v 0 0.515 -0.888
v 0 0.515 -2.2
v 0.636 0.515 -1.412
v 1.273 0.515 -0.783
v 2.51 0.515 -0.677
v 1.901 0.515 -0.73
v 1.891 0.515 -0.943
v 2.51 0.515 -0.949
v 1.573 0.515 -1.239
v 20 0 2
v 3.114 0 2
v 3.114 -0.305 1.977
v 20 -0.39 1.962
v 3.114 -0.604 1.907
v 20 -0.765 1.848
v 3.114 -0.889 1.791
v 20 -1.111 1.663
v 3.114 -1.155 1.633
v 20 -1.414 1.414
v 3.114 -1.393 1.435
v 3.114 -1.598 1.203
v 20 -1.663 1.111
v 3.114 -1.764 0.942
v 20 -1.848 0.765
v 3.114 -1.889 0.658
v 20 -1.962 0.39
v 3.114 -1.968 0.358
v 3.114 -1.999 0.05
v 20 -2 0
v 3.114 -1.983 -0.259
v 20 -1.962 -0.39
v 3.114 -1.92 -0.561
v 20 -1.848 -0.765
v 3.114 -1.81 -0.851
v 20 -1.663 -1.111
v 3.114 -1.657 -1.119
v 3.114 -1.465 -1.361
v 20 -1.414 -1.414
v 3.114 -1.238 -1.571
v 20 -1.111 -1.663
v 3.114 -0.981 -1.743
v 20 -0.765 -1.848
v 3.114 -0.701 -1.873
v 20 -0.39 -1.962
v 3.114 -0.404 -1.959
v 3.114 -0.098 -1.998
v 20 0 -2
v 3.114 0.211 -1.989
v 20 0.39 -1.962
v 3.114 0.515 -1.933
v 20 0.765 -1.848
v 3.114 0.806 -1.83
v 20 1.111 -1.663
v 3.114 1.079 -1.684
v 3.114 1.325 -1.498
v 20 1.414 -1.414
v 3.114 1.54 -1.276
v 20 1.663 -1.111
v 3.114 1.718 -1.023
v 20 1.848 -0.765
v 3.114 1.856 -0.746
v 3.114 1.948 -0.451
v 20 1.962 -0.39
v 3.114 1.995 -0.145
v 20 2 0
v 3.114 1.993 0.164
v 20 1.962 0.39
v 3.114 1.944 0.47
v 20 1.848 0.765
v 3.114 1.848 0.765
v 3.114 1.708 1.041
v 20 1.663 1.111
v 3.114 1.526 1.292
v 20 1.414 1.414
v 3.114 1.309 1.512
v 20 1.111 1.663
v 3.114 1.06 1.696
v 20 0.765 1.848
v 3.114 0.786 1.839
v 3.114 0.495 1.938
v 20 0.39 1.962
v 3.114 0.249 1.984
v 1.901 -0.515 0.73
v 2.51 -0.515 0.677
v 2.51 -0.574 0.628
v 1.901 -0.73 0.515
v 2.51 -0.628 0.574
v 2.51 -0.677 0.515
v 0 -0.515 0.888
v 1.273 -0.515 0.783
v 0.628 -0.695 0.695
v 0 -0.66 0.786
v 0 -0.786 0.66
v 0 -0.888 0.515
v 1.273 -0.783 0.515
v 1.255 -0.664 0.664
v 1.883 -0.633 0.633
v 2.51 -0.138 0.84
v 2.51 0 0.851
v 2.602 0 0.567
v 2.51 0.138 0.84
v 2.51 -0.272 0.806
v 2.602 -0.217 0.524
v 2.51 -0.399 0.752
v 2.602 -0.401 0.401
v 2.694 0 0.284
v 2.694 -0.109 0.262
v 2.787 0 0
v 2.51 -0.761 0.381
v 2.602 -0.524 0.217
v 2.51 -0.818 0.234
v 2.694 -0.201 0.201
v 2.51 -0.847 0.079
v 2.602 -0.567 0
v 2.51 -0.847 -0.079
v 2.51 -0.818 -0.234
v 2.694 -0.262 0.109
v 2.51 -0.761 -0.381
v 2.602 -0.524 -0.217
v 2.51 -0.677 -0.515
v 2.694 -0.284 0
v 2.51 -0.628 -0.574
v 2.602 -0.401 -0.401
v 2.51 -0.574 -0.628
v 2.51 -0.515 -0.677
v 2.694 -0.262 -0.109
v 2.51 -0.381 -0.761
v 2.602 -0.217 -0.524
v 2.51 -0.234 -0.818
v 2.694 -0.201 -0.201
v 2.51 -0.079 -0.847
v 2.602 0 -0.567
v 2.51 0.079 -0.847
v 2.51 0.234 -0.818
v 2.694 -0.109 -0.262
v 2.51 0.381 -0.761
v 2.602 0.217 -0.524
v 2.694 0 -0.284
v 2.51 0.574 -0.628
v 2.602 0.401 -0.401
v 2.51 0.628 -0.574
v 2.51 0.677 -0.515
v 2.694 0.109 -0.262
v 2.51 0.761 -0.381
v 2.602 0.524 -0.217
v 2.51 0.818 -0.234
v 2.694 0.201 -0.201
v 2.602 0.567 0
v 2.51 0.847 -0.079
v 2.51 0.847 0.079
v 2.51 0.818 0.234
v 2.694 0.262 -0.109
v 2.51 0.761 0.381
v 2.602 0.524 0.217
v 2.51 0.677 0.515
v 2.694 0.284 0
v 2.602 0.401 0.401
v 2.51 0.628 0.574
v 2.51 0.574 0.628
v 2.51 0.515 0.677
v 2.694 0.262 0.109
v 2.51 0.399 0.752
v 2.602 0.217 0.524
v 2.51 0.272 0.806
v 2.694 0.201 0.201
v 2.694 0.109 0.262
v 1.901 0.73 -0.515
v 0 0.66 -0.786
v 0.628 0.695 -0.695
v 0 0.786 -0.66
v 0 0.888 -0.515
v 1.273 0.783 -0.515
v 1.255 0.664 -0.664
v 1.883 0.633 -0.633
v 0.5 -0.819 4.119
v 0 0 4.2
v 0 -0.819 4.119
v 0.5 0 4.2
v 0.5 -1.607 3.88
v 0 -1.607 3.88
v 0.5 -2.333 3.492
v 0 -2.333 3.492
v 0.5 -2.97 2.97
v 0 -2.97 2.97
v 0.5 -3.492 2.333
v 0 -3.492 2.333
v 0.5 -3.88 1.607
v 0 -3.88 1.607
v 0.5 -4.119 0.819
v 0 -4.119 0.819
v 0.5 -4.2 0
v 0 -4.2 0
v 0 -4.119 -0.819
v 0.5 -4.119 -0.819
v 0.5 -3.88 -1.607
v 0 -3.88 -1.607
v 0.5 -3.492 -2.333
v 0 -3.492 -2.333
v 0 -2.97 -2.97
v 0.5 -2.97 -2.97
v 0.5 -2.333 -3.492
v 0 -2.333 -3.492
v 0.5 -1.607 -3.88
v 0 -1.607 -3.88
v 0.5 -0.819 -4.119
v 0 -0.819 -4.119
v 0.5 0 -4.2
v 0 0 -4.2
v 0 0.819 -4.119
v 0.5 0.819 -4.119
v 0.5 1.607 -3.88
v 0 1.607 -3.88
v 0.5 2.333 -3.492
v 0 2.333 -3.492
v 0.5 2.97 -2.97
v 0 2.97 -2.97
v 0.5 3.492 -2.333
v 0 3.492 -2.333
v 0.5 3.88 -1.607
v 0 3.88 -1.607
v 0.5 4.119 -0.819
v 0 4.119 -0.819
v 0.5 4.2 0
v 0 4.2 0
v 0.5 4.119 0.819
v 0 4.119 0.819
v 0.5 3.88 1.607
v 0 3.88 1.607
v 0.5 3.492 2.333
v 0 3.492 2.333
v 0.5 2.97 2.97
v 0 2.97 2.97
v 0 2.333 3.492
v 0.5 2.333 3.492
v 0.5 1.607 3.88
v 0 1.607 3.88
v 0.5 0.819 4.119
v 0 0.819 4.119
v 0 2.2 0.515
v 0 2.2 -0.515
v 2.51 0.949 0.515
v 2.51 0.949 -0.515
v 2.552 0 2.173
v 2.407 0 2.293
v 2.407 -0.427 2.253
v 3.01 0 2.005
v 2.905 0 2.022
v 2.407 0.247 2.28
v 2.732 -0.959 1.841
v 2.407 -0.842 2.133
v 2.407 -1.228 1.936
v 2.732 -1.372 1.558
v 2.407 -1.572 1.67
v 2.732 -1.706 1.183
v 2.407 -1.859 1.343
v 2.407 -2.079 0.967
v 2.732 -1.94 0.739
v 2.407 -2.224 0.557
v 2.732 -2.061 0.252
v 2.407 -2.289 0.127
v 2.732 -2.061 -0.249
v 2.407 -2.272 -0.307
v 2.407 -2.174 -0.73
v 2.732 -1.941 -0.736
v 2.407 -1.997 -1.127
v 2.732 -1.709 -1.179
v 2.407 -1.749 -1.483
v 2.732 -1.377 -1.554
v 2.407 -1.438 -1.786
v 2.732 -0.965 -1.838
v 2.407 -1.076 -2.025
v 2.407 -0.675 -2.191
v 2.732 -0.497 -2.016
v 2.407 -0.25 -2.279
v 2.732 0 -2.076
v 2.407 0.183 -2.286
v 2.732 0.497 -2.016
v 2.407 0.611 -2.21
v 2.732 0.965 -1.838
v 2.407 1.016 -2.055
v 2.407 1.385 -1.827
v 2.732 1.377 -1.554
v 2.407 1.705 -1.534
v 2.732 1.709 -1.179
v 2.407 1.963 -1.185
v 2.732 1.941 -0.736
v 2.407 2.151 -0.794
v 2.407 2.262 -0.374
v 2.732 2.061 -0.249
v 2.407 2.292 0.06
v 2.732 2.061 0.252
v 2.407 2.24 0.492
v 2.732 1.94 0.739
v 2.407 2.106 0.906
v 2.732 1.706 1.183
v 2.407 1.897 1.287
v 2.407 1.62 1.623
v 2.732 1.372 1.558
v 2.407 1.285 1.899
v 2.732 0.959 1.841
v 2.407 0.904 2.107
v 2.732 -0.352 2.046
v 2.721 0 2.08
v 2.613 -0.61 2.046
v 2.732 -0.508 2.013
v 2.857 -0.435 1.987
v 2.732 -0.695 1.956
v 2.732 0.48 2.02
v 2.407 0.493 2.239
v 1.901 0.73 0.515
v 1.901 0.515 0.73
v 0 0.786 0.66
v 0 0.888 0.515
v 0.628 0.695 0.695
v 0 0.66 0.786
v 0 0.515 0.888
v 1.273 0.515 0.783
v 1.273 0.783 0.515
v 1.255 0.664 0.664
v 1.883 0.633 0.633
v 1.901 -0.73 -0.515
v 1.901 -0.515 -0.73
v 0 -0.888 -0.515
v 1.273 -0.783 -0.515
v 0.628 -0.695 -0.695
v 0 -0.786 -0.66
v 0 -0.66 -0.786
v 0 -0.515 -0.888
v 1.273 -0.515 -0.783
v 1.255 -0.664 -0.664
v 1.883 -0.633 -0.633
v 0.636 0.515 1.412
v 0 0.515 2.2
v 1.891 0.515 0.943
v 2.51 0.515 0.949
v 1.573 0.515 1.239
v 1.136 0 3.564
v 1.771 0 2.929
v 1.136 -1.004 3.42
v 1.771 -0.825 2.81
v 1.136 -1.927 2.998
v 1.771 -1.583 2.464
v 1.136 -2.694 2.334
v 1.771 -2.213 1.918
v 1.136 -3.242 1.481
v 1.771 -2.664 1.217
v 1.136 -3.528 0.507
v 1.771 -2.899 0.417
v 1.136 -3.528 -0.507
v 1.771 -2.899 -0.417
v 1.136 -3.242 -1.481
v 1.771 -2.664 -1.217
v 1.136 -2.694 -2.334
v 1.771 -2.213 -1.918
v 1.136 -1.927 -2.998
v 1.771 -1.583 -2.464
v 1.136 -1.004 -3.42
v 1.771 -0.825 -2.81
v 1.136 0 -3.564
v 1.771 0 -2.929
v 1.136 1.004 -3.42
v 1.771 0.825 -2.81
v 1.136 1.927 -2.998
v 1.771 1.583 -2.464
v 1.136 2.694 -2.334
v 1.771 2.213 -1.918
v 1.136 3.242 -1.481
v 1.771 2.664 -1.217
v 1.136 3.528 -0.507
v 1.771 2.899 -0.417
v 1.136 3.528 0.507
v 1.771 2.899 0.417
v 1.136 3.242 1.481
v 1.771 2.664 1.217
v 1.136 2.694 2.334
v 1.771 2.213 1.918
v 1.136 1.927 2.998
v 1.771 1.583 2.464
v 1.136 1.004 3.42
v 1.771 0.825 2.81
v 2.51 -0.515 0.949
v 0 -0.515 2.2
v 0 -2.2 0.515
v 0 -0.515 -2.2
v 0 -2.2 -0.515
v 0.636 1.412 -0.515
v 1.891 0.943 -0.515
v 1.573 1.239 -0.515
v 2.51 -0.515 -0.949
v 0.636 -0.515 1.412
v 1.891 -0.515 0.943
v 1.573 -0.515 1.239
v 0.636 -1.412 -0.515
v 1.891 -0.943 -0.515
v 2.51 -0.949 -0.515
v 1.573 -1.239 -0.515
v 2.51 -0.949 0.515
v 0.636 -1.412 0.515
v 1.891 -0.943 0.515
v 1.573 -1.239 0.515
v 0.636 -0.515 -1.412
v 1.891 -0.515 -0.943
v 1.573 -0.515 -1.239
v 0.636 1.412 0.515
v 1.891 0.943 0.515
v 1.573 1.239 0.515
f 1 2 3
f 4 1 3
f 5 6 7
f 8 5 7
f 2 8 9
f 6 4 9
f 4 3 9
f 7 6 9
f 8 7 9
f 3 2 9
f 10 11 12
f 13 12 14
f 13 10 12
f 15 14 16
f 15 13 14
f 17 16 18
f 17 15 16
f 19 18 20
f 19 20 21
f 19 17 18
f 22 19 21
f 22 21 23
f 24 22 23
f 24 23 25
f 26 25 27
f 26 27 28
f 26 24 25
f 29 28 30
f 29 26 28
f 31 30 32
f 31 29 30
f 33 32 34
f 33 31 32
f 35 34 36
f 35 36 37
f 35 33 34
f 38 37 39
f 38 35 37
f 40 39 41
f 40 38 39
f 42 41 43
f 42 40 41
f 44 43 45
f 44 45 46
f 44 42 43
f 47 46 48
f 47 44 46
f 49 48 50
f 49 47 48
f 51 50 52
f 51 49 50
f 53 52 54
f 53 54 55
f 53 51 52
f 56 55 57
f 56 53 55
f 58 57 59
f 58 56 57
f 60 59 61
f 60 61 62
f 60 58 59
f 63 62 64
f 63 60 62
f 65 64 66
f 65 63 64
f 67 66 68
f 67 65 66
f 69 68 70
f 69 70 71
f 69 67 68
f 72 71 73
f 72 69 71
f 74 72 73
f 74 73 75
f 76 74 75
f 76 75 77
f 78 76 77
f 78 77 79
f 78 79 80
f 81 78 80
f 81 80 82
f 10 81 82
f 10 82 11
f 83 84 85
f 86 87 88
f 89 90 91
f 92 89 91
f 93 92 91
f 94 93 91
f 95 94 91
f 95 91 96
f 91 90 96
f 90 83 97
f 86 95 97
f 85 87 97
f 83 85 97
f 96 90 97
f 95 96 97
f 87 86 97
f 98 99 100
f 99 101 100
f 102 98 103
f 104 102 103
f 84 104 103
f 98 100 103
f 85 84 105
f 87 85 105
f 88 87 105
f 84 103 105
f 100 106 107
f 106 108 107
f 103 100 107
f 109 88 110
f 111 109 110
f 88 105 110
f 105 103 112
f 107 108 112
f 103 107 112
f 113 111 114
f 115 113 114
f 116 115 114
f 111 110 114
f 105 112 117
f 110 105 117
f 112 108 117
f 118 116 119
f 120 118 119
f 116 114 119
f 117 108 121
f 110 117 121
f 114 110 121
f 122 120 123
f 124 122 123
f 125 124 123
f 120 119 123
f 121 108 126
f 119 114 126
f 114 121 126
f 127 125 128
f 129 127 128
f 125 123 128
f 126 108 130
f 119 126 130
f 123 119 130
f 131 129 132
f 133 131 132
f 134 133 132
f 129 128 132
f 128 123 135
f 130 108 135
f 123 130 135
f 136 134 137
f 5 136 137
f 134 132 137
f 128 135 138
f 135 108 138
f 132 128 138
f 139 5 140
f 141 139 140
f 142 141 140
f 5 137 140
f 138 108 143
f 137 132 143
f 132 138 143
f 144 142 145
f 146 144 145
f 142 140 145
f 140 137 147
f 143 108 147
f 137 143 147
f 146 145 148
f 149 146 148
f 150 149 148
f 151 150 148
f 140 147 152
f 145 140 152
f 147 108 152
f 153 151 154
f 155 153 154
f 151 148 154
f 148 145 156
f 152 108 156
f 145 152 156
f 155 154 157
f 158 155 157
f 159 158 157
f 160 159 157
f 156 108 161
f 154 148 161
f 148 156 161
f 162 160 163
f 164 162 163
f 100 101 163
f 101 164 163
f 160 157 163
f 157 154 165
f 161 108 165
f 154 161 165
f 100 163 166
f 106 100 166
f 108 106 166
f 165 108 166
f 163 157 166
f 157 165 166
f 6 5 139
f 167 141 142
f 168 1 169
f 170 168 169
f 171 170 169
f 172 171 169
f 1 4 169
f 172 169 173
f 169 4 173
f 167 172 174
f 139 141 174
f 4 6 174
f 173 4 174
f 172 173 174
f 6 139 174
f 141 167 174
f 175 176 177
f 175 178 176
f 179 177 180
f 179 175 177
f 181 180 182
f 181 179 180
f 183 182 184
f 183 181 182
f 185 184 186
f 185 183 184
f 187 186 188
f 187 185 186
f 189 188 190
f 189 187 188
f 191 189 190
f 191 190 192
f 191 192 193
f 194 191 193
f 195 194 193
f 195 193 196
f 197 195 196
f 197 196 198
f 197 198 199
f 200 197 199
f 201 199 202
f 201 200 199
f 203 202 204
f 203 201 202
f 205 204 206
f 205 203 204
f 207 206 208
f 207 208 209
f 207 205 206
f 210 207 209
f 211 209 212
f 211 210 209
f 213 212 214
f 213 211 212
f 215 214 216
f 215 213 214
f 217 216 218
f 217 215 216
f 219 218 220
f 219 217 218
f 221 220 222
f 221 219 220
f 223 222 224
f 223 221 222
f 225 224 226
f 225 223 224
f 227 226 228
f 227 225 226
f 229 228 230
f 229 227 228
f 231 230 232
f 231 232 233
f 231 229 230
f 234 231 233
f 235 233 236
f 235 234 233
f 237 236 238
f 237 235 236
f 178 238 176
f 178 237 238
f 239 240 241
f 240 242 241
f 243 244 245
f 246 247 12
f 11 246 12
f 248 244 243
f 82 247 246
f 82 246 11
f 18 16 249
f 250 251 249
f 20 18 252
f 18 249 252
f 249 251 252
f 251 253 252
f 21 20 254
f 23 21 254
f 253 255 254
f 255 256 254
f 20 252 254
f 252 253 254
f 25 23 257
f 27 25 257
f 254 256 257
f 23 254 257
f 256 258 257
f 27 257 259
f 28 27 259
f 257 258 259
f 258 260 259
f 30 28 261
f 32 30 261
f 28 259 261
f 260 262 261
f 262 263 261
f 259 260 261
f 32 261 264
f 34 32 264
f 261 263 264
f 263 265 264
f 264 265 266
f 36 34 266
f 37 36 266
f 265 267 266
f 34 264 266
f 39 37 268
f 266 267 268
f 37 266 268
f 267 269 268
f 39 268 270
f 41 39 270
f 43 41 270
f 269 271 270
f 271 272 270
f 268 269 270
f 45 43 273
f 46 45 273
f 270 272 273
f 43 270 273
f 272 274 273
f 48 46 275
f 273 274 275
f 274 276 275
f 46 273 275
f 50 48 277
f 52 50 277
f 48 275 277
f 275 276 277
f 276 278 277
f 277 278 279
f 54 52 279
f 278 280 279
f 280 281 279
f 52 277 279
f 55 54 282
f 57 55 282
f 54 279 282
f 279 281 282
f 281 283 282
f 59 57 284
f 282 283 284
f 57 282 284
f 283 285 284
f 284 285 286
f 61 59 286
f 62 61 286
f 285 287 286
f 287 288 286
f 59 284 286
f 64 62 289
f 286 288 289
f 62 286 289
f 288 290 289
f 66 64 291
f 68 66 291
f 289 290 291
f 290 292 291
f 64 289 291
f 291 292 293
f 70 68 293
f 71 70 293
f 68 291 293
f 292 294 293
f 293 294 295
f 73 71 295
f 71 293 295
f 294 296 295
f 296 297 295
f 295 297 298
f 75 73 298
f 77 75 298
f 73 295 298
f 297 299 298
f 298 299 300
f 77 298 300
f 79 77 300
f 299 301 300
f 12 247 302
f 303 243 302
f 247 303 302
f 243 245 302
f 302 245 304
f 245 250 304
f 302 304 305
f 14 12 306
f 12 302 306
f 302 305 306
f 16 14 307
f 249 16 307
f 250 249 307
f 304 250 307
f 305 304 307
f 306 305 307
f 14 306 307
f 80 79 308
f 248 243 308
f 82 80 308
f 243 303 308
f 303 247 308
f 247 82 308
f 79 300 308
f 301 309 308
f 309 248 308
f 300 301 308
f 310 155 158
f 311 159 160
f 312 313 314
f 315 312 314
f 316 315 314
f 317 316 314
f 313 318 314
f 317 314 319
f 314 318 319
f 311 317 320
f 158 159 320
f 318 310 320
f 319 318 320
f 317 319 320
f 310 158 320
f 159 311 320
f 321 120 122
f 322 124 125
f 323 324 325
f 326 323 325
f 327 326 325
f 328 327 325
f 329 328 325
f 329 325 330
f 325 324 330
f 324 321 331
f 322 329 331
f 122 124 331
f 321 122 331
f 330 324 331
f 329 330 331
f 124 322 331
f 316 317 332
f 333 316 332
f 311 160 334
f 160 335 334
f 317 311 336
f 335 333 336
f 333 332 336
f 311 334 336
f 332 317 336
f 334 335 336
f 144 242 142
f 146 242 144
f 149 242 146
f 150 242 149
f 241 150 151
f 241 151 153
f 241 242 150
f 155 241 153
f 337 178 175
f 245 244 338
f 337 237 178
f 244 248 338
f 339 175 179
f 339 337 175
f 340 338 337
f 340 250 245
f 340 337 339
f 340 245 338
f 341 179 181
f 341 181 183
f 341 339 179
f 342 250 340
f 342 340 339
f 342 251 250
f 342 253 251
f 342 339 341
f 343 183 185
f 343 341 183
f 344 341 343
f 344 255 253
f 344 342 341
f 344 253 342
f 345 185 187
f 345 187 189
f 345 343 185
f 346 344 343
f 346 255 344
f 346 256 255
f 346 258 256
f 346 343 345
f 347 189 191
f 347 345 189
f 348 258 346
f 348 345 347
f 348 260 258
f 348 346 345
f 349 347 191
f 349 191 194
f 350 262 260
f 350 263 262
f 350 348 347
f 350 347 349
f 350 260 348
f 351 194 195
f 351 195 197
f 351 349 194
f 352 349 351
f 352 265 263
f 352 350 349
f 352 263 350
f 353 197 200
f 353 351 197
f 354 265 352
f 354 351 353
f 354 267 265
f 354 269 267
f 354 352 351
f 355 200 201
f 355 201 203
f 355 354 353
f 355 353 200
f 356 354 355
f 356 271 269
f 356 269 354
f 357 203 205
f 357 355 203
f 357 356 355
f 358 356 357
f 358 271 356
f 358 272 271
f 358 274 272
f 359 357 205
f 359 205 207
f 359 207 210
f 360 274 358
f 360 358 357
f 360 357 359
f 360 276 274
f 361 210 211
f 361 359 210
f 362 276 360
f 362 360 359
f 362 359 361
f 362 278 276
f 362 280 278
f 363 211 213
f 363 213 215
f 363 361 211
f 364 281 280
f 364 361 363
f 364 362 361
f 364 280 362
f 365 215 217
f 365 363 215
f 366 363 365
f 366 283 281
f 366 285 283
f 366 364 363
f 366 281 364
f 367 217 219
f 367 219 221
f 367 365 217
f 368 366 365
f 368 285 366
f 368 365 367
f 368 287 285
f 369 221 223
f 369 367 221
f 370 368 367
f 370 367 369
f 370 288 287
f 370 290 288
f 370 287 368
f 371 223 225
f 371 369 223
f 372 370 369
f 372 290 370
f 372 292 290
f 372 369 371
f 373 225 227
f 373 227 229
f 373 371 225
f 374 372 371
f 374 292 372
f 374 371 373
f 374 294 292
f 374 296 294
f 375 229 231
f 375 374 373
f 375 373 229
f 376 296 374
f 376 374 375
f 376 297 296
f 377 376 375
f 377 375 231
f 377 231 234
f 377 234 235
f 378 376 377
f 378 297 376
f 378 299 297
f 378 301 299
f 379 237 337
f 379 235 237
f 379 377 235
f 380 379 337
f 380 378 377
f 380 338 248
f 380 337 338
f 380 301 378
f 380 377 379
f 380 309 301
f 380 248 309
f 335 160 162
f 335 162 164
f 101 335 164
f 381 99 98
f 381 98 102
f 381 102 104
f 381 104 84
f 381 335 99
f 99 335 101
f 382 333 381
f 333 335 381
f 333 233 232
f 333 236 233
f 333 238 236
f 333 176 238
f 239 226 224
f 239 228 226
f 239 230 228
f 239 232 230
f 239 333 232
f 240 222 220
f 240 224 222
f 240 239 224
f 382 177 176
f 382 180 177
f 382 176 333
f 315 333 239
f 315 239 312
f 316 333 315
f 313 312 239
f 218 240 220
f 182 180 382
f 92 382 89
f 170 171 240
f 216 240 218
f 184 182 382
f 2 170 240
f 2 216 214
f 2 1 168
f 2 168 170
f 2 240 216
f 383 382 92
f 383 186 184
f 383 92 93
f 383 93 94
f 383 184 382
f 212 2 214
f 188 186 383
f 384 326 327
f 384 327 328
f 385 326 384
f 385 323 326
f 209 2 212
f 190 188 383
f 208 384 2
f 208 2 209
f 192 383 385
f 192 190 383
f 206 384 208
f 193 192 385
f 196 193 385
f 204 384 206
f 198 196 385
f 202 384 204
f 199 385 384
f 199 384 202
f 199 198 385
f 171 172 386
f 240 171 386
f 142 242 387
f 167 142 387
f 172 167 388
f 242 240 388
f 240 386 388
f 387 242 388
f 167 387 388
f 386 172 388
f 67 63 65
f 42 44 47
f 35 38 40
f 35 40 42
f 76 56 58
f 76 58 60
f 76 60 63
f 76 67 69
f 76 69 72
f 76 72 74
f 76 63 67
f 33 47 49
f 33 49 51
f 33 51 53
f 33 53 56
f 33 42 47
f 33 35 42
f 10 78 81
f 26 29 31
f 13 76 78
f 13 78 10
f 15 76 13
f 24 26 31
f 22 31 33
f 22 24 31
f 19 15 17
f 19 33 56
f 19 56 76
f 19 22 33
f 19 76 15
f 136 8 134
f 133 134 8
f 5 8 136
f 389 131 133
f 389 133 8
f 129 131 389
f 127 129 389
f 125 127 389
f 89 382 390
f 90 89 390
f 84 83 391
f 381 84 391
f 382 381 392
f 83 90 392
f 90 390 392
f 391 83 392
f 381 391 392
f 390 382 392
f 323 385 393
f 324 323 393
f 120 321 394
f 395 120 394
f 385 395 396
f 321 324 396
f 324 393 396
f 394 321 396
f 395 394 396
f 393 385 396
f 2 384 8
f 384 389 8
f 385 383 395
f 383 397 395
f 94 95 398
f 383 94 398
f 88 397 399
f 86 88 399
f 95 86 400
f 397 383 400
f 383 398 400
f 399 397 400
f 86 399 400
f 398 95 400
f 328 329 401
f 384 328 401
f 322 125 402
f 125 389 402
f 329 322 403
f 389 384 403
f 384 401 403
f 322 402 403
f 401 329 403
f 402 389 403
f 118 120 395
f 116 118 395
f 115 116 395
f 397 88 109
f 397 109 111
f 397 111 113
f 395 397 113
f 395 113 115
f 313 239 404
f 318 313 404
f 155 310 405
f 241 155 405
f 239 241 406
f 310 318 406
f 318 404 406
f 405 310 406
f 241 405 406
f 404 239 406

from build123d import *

# Parameters (mm, degrees)
FILLET1_R    = 1
RECPAT_COUNT = 2
RECPAT_ANGLE = 90


with BuildPart() as part:
    # BodySke → Base-Revolve (revolve)
    with BuildSketch(Plane.XY, mode=Mode.PRIVATE) as base_revolve_sk:
        Polygon((0, 0), (0, 4.2), (0.5, 4.2), (2.7, 2), (20, 2), (20, 0), align=None)
    revolve(base_revolve_sk.sketch.rotate(Axis((-6.35, 0, 0), (1, 0, 0)), 90), axis=Axis((-6.35, 0, 0), (1, 0, 0)))

    # Fillet1
    fillet1_edges = [part.edges().sort_by_distance(p)[0] for p in [
        (2.7, 0, -2),
    ]]
    fillet(fillet1_edges, radius=FILLET1_R)

    # Sketch3 → Recess section 0
    with BuildSketch(Plane.ZY):
        with BuildLine():
            Line((-0.515, 2.2), (0.515, 2.2))
            Line((0.515, 2.2), (0.515, -2.2))
            Line((0.515, -2.2), (-0.515, -2.2))
            Line((-0.515, -2.2), (-0.515, 2.2))
        make_face()
    # Sketch4 → Recess section 1
    with BuildSketch(Plane.ZY.offset(-2.51)):
        with BuildLine():
            Line((-0.515, 0.948560207), (0.515, 0.948560207))
            Line((0.515, 0.948560207), (0.515, -0.948560207))
            Line((0.515, -0.948560207), (-0.515, -0.948560207))
            Line((-0.515, -0.948560207), (-0.515, 0.948560207))
        make_face()
    recess = loft(mode=Mode.SUBTRACT)

    # RecPat: Recess ×2 about axis
    recpat_axis = Axis((0, 0, 0), (1, 0, 0))
    for i in range(1, RECPAT_COUNT):
        add(recess.rotate(recpat_axis, i * RECPAT_ANGLE / (RECPAT_COUNT - 1)), mode=Mode.SUBTRACT)

    # RecCorSke → RecessCore (revolve, cut)
    with BuildSketch(Plane.XY, mode=Mode.PRIVATE) as recesscore_sk:
        Polygon((0, 0), (0, 1.026516298), (2.51, 0.851), (2.786506661, 0), align=None)
    revolve(recesscore_sk.sketch.rotate(Axis((-3.175, 0, 0), (1, 0, 0)), 90), axis=Axis((-3.175, 0, 0), (1, 0, 0)), mode=Mode.SUBTRACT)


solid = part.part
